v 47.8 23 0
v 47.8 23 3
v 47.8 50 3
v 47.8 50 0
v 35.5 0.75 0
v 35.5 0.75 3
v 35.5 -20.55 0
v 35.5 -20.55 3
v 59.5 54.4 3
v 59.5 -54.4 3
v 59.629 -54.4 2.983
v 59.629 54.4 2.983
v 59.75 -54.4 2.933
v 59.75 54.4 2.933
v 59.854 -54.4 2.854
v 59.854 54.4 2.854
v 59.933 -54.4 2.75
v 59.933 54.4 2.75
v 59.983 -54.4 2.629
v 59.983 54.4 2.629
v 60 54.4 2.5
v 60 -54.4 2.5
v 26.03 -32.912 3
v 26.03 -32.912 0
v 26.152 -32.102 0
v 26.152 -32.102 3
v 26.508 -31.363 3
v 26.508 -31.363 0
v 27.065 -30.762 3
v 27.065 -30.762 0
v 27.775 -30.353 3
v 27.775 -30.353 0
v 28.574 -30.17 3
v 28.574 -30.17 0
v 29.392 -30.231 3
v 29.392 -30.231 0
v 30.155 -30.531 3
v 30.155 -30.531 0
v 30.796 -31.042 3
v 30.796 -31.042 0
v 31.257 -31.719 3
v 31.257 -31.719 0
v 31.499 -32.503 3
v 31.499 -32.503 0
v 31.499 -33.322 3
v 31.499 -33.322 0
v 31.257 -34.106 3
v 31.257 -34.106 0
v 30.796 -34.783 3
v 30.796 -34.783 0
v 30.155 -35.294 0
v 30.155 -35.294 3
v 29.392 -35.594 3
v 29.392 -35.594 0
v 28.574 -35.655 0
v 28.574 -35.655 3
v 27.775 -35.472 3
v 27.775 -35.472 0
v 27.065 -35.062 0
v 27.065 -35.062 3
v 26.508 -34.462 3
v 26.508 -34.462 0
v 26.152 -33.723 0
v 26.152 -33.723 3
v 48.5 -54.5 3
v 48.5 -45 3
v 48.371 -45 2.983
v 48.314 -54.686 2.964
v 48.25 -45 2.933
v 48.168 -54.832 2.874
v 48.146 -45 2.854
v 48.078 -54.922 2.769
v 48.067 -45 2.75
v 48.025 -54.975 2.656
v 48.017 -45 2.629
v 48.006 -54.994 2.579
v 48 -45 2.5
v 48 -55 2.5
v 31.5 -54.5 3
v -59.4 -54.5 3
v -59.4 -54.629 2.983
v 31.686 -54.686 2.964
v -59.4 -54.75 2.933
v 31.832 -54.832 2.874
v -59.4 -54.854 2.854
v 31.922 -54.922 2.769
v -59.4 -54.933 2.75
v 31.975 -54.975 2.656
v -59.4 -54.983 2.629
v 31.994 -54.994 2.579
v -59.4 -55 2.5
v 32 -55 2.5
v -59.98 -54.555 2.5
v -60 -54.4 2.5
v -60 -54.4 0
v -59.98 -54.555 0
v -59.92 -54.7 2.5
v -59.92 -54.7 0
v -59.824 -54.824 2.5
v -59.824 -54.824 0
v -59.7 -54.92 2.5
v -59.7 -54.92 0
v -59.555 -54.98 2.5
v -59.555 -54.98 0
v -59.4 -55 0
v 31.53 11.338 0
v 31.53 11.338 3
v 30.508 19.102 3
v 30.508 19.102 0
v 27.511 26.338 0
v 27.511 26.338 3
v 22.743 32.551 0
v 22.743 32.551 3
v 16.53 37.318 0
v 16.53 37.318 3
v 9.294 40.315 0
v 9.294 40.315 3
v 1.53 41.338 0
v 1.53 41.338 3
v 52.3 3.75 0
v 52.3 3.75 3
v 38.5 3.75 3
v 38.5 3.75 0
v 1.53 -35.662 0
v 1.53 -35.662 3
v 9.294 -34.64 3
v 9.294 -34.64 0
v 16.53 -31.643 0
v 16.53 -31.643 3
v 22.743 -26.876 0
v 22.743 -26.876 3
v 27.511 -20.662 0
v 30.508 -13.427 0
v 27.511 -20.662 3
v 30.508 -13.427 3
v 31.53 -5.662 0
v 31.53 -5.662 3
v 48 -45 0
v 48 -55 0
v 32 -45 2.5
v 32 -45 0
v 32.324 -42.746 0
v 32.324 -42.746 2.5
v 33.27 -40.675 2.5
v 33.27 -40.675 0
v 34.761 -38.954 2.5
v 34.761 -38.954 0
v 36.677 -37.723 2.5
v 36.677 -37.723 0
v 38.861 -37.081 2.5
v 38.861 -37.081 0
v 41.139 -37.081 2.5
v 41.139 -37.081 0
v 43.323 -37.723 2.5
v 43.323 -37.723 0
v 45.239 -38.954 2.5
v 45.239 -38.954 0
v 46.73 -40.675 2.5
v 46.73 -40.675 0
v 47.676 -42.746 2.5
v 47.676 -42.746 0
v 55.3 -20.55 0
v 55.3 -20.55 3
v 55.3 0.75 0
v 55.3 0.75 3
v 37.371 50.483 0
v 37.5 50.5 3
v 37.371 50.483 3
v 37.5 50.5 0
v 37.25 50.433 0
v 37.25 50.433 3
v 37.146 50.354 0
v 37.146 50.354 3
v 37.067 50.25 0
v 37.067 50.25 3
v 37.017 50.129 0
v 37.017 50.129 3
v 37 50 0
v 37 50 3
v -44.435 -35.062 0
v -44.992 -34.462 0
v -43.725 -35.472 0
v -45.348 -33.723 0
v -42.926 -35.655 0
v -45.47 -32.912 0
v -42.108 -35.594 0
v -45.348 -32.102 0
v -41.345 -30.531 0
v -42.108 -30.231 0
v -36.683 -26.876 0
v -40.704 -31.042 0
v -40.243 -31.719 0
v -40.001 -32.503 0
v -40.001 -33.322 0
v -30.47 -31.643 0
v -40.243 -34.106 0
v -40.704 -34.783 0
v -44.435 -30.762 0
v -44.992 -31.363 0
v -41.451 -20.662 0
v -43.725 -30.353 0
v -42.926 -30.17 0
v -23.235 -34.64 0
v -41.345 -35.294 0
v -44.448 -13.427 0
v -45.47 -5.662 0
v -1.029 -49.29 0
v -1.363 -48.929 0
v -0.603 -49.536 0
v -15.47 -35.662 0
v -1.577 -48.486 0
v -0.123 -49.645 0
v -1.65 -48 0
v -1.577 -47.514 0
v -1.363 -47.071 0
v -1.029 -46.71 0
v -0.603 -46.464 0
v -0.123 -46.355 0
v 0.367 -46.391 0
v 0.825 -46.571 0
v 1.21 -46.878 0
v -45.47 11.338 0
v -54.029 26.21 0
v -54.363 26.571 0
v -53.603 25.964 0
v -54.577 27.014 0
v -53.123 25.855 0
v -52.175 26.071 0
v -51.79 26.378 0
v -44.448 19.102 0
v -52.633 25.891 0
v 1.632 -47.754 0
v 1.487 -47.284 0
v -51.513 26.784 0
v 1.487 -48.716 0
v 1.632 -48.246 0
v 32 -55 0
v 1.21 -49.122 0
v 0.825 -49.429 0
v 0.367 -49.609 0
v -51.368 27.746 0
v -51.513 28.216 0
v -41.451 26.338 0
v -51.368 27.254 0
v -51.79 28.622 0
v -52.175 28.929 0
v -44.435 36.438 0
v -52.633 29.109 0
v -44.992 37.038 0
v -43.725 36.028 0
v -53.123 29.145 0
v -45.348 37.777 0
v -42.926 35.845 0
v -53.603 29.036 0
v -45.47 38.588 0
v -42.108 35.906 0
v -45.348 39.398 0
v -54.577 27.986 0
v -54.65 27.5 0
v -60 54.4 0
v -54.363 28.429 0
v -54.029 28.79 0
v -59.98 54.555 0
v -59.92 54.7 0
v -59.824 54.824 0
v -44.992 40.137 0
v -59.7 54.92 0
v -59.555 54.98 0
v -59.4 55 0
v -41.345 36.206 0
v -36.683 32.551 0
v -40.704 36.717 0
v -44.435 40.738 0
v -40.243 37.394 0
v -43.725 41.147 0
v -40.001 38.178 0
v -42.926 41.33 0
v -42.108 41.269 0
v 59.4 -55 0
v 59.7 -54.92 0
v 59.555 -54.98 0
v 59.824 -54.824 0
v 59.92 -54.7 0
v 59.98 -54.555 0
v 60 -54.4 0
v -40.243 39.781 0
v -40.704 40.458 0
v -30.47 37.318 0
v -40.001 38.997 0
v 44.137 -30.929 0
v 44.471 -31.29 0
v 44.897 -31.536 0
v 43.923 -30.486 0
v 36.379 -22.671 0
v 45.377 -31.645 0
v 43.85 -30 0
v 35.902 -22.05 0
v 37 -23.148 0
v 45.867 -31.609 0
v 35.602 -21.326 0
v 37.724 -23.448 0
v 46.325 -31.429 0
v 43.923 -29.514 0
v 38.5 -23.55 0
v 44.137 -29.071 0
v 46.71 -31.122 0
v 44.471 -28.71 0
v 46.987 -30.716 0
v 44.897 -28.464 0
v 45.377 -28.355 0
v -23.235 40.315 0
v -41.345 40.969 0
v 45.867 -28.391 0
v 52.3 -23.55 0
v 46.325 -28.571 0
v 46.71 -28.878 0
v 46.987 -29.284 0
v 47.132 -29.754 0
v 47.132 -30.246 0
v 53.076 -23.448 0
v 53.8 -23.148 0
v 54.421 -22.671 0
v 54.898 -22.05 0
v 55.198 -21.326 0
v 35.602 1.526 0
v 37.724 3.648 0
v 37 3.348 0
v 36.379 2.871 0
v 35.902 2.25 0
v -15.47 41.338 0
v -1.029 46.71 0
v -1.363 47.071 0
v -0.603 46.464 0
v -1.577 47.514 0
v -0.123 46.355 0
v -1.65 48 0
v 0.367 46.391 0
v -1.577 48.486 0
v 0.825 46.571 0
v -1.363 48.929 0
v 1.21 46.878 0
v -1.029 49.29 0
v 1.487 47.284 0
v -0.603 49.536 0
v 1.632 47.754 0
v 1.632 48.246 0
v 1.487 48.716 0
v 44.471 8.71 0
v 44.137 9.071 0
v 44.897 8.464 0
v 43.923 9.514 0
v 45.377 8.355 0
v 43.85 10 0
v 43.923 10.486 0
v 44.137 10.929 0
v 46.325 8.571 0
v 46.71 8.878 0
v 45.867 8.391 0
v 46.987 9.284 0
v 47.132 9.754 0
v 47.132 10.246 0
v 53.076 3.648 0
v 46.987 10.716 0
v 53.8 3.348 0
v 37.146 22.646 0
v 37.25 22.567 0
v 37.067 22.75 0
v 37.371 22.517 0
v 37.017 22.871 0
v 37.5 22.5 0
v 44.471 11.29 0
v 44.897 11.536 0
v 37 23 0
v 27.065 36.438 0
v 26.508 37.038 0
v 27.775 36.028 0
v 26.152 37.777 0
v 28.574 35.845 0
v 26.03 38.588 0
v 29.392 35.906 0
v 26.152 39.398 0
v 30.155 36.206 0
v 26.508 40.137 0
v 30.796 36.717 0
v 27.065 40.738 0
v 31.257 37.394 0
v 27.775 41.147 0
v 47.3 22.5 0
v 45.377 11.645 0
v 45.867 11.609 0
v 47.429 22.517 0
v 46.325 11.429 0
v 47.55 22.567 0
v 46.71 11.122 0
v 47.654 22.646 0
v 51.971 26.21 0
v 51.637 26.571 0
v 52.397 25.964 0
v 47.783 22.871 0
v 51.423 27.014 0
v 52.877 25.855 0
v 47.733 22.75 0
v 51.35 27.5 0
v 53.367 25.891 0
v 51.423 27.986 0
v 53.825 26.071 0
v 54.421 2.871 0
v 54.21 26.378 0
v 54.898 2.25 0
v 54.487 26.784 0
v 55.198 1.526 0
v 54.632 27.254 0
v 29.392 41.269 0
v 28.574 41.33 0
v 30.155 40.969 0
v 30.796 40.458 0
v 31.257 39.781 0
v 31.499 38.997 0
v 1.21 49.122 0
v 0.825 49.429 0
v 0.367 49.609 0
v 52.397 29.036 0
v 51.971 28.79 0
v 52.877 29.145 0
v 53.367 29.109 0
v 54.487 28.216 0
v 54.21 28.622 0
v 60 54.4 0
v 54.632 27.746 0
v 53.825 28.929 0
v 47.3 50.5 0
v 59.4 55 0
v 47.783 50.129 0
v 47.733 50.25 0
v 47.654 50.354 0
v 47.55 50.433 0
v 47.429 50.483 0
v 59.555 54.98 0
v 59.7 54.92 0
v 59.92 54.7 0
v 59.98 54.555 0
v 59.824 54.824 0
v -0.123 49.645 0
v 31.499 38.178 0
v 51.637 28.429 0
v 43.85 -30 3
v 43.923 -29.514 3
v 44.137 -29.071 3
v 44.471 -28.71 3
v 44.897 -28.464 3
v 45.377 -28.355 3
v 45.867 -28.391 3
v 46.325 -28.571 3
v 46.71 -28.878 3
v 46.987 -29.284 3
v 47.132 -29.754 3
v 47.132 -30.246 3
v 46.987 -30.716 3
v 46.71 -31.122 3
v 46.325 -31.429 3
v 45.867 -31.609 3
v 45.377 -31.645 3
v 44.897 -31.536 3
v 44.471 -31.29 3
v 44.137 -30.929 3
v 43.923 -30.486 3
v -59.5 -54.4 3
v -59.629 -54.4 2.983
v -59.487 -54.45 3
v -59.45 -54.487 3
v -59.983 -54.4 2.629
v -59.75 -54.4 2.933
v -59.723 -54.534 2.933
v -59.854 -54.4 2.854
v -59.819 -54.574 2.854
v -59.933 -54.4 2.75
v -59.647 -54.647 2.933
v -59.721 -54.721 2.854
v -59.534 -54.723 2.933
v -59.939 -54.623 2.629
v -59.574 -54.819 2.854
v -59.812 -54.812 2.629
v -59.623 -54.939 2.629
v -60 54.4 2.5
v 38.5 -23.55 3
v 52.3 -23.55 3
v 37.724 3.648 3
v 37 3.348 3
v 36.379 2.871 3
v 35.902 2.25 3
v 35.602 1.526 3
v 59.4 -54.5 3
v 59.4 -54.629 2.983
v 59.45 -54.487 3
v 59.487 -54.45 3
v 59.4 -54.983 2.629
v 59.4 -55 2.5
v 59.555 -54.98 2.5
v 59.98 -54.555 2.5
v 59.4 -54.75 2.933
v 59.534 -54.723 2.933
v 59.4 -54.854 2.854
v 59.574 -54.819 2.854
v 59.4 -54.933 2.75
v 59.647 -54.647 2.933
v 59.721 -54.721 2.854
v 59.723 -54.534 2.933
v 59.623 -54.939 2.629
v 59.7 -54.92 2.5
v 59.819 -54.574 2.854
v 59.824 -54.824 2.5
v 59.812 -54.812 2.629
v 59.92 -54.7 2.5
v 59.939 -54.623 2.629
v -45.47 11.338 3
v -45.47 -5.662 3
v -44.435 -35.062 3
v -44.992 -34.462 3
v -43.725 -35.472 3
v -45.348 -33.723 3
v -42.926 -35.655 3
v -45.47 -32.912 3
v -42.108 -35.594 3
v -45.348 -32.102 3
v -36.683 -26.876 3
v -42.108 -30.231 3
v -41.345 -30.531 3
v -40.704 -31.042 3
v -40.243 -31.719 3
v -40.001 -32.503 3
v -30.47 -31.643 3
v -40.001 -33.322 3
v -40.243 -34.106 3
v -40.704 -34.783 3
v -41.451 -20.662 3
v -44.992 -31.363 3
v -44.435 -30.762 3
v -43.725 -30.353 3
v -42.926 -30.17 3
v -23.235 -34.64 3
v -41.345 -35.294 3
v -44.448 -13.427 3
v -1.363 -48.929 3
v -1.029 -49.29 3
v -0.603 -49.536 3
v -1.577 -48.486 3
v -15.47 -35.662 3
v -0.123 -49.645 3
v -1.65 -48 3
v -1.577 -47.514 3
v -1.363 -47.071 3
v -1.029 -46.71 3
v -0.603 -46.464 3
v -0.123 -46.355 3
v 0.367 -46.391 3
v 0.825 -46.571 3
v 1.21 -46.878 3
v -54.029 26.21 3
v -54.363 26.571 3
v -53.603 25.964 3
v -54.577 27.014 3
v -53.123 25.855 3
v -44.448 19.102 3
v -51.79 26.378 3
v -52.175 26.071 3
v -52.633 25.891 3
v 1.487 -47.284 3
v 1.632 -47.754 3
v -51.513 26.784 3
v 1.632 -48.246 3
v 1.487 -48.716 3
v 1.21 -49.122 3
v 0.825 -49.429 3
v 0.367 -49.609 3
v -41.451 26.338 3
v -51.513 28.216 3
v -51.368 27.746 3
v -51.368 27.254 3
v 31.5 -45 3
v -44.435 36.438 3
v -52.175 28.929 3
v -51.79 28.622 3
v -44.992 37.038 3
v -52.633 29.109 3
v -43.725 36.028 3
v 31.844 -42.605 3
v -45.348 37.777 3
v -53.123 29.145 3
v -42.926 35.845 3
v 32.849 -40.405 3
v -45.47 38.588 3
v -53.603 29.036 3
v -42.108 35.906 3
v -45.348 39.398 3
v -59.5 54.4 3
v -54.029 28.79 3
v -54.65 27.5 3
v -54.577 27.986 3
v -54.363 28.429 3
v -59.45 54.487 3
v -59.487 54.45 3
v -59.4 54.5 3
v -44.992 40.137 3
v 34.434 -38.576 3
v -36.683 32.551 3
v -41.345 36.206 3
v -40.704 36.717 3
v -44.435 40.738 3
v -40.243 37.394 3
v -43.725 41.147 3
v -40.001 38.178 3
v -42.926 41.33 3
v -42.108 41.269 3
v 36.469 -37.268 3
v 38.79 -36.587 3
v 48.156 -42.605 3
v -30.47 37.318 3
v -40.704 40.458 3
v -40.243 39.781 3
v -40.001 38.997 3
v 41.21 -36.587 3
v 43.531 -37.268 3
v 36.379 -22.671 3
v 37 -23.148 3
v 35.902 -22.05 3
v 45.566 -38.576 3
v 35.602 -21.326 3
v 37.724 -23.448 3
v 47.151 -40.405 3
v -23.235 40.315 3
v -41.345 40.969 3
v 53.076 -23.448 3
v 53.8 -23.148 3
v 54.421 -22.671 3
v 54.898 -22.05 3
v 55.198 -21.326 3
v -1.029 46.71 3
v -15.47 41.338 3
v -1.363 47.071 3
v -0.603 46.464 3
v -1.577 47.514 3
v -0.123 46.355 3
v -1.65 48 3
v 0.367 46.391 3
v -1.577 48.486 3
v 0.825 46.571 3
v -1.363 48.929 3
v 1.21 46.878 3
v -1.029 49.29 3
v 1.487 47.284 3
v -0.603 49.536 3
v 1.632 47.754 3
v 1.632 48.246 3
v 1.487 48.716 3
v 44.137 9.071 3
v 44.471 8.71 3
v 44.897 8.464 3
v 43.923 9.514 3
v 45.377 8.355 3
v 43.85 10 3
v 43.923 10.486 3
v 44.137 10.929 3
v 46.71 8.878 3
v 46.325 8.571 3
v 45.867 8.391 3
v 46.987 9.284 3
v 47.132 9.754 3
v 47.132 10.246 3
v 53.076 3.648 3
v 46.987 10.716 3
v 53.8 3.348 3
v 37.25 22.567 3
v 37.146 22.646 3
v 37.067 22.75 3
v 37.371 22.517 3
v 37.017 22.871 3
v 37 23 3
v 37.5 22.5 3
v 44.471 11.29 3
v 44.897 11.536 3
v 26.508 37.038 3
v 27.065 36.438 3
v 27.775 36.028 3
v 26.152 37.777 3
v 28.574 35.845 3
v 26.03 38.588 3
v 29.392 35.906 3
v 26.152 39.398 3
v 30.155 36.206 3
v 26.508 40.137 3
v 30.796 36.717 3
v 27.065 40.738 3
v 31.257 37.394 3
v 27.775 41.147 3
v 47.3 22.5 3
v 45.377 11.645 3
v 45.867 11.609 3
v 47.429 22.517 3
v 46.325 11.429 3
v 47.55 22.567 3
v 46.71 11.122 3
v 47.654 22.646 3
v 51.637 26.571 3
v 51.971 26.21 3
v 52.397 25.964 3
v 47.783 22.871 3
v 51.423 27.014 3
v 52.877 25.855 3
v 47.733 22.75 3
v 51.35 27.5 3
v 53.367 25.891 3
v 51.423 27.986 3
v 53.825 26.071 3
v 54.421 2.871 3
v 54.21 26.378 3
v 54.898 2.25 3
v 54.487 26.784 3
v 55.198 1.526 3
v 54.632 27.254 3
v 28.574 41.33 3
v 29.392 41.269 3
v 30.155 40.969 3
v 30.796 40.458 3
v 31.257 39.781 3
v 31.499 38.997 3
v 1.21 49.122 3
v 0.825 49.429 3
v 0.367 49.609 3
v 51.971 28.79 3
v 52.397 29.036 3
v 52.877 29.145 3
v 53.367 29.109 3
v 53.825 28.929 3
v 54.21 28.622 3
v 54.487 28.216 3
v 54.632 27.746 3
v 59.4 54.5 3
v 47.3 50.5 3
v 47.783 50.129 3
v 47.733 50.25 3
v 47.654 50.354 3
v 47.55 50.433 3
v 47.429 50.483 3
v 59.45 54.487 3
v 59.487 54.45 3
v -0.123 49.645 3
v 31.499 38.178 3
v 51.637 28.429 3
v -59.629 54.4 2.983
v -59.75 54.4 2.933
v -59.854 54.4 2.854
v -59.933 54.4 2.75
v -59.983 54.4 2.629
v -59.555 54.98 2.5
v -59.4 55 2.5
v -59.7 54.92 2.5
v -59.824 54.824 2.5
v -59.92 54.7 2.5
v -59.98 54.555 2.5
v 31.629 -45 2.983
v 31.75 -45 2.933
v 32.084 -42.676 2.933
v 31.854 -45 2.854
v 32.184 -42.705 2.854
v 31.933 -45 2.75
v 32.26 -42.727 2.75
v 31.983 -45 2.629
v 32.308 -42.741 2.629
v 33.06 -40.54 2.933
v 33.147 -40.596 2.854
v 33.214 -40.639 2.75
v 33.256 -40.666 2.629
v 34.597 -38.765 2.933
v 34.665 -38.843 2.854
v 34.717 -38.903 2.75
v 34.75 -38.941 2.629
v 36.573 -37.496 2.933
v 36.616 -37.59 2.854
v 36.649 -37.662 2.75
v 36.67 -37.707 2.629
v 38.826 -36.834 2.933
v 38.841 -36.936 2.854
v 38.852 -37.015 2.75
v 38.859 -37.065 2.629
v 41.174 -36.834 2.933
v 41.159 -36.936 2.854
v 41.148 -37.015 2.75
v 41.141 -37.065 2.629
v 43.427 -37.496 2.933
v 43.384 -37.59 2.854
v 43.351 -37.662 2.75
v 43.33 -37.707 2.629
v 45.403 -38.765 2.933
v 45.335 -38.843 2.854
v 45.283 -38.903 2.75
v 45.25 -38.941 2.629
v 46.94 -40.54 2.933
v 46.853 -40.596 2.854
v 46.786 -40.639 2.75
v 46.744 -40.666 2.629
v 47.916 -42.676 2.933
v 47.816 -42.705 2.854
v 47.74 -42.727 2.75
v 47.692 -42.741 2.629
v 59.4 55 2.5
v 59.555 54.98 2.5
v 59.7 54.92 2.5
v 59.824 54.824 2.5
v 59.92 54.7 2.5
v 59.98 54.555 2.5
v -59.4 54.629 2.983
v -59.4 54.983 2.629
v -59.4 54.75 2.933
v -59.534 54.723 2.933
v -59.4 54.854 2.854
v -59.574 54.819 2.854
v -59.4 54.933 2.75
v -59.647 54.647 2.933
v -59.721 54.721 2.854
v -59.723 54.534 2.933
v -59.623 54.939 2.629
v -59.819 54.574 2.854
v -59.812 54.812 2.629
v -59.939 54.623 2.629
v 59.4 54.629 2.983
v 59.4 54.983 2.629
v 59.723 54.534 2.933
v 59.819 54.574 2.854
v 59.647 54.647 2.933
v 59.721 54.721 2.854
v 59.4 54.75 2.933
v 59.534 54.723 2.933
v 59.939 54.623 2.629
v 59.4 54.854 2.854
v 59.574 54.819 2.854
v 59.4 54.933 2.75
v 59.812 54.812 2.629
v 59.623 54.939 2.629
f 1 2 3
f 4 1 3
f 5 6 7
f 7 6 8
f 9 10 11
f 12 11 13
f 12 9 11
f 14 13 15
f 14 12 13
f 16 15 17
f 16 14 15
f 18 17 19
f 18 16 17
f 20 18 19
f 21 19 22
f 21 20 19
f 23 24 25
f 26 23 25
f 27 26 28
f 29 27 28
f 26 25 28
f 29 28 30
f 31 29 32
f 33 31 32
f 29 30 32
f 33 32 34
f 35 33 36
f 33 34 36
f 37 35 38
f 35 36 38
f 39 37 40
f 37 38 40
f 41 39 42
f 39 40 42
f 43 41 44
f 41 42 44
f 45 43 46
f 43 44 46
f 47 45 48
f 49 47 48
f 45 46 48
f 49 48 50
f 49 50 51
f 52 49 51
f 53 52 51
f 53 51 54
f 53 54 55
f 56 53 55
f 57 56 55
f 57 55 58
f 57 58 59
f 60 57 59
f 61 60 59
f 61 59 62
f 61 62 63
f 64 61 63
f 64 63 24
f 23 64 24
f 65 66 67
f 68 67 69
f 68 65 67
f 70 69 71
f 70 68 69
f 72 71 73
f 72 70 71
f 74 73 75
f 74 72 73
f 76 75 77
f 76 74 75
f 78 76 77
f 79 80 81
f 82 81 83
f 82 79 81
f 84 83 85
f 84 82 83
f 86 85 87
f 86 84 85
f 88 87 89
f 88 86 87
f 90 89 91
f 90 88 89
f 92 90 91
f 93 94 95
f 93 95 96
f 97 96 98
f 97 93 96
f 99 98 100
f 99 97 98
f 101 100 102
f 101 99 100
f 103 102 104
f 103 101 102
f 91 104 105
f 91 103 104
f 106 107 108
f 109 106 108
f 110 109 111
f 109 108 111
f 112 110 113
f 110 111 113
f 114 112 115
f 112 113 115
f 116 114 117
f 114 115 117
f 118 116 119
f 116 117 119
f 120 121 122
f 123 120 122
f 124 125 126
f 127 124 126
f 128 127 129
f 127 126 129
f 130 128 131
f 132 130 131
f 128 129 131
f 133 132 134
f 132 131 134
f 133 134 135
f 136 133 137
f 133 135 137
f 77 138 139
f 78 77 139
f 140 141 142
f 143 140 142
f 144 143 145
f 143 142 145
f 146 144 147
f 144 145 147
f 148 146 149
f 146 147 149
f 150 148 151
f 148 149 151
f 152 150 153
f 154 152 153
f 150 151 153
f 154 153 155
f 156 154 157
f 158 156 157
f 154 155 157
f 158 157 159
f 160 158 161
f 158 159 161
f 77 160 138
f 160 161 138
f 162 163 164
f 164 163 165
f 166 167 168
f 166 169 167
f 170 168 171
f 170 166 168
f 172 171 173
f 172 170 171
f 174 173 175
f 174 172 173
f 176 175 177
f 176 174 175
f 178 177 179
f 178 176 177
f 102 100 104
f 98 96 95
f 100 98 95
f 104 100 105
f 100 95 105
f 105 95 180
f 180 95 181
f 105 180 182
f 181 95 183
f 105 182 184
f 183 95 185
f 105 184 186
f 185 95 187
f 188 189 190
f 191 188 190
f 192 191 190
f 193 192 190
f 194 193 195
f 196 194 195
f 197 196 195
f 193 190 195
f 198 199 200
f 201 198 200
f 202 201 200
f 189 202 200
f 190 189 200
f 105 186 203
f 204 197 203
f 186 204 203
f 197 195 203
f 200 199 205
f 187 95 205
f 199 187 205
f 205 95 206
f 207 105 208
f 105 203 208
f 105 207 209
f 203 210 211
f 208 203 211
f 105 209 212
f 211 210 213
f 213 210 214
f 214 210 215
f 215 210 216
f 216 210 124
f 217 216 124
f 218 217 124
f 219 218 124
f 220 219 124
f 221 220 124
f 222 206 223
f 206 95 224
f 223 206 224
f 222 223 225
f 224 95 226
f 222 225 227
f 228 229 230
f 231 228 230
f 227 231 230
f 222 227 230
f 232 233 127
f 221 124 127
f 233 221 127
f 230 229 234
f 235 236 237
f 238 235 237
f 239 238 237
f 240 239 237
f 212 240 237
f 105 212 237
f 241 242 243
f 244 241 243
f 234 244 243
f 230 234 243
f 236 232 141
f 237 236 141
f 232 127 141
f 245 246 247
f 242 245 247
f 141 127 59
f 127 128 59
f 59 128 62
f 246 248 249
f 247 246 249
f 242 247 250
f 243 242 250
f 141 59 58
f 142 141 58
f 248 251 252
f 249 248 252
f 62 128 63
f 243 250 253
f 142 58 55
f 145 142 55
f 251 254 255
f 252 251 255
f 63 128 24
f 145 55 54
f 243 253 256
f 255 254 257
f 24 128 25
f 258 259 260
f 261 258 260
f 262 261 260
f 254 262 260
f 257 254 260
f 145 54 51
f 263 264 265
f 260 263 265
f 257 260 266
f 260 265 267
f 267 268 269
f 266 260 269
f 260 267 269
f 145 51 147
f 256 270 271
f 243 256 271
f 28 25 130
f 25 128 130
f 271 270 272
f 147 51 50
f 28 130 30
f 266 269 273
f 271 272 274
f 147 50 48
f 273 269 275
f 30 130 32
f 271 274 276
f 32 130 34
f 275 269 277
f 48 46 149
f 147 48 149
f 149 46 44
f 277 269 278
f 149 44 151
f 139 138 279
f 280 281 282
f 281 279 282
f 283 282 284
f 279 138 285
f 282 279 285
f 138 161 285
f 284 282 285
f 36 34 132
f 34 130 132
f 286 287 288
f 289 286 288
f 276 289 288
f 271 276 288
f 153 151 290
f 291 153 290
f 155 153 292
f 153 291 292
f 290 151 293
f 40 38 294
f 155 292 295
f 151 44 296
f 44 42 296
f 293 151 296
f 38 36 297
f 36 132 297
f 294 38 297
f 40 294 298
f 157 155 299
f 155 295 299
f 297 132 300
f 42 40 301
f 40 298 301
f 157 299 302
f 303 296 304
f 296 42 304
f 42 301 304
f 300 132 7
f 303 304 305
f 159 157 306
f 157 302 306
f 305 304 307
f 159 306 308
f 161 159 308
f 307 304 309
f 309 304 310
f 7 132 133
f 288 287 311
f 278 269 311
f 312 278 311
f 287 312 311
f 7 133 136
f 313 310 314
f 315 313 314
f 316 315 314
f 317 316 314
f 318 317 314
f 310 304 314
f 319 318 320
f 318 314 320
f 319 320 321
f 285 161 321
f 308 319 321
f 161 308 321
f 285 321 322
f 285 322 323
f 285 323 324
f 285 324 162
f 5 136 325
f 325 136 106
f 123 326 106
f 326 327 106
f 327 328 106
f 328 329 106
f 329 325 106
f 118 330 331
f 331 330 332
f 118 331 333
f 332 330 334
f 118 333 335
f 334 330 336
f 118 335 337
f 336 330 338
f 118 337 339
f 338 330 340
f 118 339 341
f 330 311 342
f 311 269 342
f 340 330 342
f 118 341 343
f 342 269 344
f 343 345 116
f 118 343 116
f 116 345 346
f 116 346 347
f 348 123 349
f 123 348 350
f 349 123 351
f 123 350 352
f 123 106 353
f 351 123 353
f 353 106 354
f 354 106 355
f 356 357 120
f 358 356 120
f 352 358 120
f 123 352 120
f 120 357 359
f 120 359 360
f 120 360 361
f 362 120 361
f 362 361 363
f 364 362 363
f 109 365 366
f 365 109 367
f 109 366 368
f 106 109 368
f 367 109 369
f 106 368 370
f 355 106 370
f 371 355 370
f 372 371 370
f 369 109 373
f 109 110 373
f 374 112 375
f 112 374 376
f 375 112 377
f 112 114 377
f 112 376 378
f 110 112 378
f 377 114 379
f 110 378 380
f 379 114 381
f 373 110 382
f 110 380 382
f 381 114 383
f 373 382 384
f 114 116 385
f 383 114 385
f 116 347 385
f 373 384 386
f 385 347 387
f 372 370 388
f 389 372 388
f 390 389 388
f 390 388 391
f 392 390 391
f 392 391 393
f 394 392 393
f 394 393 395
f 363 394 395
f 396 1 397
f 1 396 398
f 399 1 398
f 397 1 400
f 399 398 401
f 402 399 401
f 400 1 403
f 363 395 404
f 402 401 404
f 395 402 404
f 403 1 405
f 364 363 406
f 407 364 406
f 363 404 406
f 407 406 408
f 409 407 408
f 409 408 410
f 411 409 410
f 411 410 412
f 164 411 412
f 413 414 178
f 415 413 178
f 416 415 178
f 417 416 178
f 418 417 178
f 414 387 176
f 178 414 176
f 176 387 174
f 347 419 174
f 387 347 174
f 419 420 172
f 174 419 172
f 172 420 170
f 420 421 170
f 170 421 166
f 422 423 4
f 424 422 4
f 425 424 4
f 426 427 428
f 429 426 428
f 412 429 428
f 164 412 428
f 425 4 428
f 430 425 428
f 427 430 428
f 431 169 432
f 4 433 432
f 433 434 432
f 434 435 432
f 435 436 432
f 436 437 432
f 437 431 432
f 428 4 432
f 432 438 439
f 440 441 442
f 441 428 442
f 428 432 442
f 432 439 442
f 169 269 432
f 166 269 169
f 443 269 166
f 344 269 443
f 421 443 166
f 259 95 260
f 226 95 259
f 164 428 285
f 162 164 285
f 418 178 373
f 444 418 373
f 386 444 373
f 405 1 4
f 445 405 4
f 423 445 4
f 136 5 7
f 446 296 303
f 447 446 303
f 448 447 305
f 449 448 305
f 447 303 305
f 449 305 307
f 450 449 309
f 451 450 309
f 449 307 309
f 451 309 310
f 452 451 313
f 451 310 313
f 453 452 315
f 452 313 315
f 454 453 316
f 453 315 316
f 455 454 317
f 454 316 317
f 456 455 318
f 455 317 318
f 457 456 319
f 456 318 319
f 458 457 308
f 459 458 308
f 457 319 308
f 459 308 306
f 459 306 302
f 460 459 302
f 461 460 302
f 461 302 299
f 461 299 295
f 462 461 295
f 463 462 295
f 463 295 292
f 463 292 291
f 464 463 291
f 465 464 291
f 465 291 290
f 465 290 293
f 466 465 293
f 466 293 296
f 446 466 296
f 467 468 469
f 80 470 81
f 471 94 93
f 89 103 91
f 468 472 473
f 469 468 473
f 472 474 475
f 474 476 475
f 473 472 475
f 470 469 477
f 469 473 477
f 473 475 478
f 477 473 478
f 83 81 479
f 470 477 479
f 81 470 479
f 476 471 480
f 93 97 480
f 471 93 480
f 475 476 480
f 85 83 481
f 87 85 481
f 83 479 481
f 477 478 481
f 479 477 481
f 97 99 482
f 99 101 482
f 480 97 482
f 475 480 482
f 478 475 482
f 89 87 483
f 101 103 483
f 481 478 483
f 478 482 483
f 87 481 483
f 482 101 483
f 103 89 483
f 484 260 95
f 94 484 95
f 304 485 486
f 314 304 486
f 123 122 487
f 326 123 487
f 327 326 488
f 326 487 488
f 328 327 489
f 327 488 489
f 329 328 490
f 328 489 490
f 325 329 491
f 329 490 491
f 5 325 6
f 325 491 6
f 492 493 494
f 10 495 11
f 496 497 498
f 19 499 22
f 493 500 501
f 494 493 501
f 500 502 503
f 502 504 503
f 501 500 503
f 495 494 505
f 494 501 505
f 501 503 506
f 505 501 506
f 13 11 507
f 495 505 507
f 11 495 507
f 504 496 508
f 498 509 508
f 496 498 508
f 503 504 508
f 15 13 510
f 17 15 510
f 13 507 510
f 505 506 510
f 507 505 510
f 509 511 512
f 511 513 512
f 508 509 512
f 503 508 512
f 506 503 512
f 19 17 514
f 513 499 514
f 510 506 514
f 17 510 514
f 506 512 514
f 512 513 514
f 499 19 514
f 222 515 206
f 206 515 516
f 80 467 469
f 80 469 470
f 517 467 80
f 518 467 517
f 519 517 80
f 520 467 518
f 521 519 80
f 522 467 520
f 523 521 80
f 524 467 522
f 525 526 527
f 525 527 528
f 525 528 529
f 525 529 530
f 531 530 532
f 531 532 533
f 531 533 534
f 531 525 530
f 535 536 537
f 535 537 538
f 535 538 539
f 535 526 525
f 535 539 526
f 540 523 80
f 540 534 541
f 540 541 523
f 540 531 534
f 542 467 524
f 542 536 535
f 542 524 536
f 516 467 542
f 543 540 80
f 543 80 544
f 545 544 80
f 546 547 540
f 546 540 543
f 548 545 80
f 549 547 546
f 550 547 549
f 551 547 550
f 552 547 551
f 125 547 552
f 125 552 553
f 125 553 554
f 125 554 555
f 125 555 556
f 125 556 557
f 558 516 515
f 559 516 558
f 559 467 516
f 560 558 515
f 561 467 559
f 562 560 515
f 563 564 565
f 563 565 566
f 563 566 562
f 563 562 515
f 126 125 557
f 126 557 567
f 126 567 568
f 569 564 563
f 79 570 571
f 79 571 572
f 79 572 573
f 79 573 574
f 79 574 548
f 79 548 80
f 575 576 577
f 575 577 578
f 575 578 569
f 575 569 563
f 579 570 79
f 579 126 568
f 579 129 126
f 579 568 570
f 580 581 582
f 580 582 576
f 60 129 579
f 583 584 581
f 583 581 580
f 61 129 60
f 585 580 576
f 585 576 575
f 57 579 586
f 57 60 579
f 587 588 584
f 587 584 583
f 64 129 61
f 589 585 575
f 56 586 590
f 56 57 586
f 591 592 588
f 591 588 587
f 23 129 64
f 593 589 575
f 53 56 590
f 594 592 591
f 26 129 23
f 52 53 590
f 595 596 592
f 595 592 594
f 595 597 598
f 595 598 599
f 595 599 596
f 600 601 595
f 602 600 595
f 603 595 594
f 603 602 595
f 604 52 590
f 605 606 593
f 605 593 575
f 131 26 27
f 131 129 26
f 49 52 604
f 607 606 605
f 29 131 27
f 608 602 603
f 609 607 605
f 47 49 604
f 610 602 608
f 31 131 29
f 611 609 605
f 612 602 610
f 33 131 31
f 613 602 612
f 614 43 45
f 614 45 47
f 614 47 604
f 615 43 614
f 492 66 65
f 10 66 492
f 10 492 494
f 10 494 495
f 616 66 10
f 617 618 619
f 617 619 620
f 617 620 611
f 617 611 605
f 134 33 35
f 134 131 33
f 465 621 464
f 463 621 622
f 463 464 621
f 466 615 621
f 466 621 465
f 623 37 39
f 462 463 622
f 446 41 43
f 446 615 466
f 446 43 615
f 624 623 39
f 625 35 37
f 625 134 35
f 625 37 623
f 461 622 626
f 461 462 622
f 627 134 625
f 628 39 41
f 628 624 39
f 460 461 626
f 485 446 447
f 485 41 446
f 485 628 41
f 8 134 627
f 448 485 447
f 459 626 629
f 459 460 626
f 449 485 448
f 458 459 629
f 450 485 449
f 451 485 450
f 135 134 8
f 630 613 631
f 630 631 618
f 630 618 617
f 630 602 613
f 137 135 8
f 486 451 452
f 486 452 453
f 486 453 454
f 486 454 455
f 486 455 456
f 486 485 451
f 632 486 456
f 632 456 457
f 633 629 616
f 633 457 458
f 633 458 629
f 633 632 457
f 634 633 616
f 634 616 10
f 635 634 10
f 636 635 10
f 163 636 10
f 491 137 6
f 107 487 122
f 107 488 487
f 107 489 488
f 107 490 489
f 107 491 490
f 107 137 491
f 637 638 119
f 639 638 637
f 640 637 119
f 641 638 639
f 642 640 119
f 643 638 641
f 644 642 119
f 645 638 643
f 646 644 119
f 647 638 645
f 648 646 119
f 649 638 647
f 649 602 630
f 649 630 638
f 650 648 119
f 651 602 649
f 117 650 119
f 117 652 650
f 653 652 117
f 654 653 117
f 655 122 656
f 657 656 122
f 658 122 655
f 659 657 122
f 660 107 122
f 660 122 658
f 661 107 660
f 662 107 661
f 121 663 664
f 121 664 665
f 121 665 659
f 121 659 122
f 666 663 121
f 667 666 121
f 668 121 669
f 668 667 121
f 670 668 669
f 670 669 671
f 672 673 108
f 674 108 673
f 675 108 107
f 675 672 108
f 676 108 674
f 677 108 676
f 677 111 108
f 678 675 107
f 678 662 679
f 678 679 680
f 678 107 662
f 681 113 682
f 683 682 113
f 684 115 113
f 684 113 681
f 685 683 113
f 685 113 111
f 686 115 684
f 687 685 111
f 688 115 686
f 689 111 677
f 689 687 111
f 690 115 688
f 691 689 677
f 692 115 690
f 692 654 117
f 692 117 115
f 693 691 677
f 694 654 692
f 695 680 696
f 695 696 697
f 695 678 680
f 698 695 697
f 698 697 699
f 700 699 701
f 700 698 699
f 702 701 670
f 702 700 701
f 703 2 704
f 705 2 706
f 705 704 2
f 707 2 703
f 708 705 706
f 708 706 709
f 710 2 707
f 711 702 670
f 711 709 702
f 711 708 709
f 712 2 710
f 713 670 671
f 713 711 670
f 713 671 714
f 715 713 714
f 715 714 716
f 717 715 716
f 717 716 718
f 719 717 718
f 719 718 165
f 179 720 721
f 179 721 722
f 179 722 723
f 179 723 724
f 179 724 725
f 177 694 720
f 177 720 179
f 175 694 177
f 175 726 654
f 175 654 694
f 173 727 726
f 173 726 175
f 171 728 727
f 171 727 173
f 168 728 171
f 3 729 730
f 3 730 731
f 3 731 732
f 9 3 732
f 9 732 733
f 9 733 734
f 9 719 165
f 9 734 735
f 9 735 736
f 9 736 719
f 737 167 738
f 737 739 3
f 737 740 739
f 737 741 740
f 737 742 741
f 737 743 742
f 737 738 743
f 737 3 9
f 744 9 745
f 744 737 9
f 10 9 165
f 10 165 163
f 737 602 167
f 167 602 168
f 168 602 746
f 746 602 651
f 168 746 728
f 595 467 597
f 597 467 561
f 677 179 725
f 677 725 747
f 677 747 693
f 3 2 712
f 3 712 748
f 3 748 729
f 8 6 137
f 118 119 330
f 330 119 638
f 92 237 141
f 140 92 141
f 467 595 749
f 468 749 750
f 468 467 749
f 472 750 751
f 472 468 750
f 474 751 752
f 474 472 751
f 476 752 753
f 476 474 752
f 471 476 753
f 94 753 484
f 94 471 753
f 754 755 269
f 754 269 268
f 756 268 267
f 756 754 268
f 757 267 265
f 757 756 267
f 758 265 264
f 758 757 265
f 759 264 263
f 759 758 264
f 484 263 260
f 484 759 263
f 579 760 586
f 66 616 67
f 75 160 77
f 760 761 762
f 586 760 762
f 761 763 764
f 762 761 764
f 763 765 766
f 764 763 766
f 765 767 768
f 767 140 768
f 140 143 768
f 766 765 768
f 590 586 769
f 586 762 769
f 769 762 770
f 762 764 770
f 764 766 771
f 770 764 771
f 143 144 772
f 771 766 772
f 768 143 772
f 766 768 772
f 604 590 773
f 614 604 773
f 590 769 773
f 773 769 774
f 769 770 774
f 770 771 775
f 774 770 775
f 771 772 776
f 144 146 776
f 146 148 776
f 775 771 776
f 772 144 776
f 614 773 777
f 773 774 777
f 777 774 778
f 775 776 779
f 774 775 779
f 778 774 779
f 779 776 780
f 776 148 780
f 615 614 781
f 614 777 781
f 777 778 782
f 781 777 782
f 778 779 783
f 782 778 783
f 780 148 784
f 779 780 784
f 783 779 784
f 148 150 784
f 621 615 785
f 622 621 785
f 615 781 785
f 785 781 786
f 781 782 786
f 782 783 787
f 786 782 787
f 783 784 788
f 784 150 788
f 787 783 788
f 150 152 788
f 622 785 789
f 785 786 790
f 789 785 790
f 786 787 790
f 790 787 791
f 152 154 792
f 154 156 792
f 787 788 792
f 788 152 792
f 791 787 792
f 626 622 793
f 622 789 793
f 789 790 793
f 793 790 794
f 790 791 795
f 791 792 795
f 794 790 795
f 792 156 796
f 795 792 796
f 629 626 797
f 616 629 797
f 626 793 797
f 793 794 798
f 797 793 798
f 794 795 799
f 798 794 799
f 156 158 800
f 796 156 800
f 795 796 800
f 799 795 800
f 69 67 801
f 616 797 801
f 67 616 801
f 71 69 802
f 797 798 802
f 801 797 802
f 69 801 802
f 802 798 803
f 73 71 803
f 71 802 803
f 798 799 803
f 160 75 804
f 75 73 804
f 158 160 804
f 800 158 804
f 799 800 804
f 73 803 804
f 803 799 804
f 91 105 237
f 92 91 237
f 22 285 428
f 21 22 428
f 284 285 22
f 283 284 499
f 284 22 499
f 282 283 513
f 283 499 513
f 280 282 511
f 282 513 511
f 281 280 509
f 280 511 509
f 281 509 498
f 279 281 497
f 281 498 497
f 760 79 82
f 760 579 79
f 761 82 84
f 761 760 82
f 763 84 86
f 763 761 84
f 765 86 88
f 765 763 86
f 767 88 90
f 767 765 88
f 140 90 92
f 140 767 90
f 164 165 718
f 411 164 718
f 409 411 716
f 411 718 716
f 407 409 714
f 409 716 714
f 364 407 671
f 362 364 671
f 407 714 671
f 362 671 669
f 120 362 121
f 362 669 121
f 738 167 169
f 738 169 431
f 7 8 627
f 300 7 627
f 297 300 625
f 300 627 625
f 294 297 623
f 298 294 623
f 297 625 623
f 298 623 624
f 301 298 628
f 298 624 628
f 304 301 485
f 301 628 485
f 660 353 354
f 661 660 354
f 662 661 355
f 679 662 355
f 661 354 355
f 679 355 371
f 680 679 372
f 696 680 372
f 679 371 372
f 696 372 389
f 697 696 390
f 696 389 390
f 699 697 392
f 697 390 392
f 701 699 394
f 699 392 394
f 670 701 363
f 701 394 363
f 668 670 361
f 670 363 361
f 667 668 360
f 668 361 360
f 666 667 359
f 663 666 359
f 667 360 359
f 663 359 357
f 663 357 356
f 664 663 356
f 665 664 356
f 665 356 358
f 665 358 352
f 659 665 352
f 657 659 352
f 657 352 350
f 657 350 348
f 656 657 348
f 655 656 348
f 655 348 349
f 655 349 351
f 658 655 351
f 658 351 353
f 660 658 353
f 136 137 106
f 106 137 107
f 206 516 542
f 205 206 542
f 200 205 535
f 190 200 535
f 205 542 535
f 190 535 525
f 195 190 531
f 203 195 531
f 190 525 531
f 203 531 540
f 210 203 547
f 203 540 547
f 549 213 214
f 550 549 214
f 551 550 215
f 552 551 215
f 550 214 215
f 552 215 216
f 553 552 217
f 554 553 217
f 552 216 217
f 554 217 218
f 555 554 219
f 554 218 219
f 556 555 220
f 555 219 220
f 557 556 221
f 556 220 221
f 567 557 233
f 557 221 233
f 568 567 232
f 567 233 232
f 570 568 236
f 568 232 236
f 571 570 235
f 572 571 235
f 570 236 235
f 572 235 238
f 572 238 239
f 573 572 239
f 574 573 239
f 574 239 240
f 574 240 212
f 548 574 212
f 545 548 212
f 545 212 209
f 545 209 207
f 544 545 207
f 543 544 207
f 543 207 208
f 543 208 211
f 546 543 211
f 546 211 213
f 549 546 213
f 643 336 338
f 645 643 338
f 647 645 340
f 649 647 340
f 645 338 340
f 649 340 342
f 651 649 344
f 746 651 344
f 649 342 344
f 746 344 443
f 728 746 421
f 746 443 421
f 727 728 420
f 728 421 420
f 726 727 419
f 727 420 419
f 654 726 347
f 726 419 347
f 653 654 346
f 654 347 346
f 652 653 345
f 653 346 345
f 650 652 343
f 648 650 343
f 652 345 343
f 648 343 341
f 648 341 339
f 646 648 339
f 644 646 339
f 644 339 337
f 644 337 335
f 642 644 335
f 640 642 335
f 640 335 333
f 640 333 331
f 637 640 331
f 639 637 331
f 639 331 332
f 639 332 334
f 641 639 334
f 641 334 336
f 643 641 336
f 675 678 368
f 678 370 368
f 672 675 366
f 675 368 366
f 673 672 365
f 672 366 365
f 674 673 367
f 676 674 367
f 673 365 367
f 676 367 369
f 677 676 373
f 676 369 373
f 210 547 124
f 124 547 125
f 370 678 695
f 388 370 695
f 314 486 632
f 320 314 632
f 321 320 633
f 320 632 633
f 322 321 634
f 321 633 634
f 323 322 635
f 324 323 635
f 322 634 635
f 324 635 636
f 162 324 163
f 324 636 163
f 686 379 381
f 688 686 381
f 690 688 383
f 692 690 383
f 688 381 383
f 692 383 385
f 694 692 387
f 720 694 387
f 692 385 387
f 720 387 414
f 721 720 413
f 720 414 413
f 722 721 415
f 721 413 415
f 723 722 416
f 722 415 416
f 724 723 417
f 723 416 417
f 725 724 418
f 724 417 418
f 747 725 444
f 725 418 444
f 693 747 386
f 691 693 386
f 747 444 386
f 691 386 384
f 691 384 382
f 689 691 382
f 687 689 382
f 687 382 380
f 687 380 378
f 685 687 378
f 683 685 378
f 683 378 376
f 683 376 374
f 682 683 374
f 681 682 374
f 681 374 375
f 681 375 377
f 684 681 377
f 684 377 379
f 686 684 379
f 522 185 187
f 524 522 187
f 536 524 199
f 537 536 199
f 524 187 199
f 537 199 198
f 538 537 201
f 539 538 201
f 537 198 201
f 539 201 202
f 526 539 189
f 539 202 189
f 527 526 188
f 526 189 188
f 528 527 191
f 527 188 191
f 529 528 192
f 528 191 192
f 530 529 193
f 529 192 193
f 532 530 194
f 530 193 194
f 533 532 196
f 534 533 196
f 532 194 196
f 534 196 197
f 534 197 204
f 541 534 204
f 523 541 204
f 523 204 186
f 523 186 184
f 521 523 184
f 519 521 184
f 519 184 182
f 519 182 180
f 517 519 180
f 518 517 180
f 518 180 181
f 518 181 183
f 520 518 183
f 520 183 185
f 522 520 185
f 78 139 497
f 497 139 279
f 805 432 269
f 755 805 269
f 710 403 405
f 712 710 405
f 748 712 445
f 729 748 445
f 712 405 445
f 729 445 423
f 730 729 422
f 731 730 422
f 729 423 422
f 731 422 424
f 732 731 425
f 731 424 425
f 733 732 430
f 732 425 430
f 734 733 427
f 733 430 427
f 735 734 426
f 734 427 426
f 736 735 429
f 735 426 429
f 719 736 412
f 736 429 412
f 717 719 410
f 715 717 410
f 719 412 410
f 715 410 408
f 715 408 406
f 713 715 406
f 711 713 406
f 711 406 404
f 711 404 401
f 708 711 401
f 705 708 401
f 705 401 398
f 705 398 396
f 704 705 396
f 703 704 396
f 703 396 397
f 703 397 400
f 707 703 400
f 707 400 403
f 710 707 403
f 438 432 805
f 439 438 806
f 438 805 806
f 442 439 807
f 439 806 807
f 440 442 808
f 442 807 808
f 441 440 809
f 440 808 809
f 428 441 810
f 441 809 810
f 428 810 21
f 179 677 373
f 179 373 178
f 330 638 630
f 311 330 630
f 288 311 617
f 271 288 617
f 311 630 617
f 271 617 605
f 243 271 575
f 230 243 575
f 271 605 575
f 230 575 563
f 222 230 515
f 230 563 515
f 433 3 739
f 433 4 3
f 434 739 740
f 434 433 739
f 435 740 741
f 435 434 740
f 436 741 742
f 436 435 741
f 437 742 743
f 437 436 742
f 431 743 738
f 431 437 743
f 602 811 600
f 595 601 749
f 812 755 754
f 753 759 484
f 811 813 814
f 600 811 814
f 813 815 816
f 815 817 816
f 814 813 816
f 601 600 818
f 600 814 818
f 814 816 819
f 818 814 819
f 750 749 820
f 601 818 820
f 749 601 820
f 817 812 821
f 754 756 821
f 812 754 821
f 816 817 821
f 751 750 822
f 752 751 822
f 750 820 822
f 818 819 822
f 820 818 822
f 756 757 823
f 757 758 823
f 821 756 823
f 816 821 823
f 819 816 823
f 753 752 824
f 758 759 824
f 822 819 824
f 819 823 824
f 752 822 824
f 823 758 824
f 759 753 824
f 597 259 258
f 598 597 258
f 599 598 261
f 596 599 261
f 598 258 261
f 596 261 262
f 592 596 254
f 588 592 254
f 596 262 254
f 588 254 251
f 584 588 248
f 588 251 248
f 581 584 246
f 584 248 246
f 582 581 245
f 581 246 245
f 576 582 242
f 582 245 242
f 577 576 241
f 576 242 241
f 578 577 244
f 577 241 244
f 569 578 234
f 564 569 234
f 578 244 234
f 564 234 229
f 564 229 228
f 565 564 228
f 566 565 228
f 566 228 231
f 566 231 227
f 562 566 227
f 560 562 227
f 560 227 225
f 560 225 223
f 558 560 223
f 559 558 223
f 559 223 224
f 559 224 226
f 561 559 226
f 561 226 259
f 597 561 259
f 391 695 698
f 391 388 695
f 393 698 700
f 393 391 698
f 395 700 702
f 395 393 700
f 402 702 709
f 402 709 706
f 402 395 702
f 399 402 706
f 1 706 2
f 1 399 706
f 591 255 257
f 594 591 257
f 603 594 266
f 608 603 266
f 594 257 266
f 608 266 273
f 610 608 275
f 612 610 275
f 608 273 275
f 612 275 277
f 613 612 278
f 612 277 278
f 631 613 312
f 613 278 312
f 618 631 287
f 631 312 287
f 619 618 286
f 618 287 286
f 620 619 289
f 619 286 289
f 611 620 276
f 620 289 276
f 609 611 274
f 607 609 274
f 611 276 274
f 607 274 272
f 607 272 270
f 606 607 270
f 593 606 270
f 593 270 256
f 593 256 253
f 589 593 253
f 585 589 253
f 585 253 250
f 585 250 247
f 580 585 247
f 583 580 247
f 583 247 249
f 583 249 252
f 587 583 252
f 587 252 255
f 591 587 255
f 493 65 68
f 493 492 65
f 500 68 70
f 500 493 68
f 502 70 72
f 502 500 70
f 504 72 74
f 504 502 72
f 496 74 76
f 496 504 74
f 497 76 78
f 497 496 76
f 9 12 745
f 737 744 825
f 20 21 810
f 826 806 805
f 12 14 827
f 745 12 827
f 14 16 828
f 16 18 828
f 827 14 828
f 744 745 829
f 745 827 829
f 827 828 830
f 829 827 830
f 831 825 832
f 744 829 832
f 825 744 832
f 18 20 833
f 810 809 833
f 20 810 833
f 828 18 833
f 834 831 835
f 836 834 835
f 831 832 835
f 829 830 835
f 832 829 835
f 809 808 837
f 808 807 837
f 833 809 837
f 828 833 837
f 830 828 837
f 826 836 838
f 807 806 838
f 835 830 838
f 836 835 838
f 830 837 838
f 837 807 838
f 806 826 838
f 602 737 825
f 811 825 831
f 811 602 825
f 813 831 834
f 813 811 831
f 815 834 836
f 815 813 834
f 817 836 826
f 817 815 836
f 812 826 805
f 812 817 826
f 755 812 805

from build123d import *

# Parameters (mm, degrees)
F1_DEPTH  = 3
F3_D      = 3.3
F5_D      = 5.5
F6_DEPTH  = 3.001
F7_R      = 0.6
F8_R      = 0.5
F10_D     = 3.3
F11_DEPTH = 3.001
F12_W     = 10.8
F12_H     = 28
F13_DEPTH = 3.001
F14_R     = 0.5


# Not quite as in the source:
# - a feature names something its author has since deleted; it is built from what else it names


with BuildPart() as f1:
    # F0 (on Top) → F1 (new body)
    with BuildSketch(Plane.XY):
        with BuildLine():
            Line((60, 55), (-60, 55))
            Line((-60, 55), (-60, -55))
            Line((-60, -55), (32, -55))
            Line((32, -55), (32, -45))
            ThreePointArc((32, -45), (40, -37), (48, -45))
            Line((48, -45), (48, -55))
            Line((48, -55), (60, -55))
            Line((60, -55), (60, 55))
        make_face()
    extrude(amount=F1_DEPTH)

    # F3 (through all)
    with Locations(Plane.XY.offset(3)):
        with Locations((-53, 27.5), (0, 48), (53, 27.5), (0, -48)):
            Hole(F3_D / 2)

    # F5 (through all)
    with Locations(Plane.XY.offset(3)):
        with Locations((-42.7202362838, 38.5875506155), (-42.7202362838, -32.9124493845), (28.7797637162, -32.9124493845), (28.7797637162, 38.5875506155)):
            Hole(F5_D / 2)

    # F4 (on face) → F6 (cut, through all)
    with BuildSketch(Plane.XY.offset(3)):
        with BuildLine():
            ThreePointArc((31.5297637162, 11.3375506155), (22.7429671518, 32.5507540511), (1.5297637162, 41.3375506155))
            Line((1.5297637162, 41.3375506155), (-15.4702362838, 41.3375506155))
            ThreePointArc((-15.4702362838, 41.3375506155), (-36.6834397194, 32.5507540511), (-45.4702362838, 11.3375506155))
            Line((-45.4702362838, 11.3375506155), (-45.4702362838, -5.6624493845))
            ThreePointArc((-45.4702362838, -5.6624493845), (-36.6834397194, -26.8756528201), (-15.4702362838, -35.6624493845))
            Line((-15.4702362838, -35.6624493845), (1.5297637162, -35.6624493845))
            ThreePointArc((1.5297637162, -35.6624493845), (22.7429671518, -26.8756528201), (31.5297637162, -5.6624493845))
            Line((31.5297637162, -5.6624493845), (31.5297637162, 11.3375506155))
        make_face()
    extrude(amount=-F6_DEPTH, mode=Mode.SUBTRACT)

    # F7
    f7_edges = [f1.edges().sort_by_distance(p)[0] for p in [
        (-60, 55, 1.5),
        (60, 55, 1.5),
        (60, -55, 1.5),
        (-60, -55, 1.5),
    ]]
    fillet(f7_edges, radius=F7_R)

    # F8
    f8_edges = [f1.edges().sort_by_distance(p)[0] for p in [
        (40, -37, 3),
        (-13.7, -55, 3),
    ]]
    fillet(f8_edges, radius=F8_R)

    # F10 (through all)
    with Locations(Plane.XY.offset(3)):
        with Locations((45.5, 10), (45.5, -30)):
            Hole(F10_D / 2)

    # F9 (on face) → F11 (cut, through all)
    with BuildSketch(Plane.XY.offset(3)):
        with BuildLine():
            Line((52.3, 3.75), (38.5, 3.75))
            ThreePointArc((38.5, 3.75), (36.3786796564, 2.8713203436), (35.5, 0.75))
            Line((35.5, 0.75), (35.5, -20.55))
            ThreePointArc((35.5, -20.55), (36.3786796564, -22.6713203436), (38.5, -23.55))
            Line((38.5, -23.55), (52.3, -23.55))
            ThreePointArc((52.3, -23.55), (54.4213203436, -22.6713203436), (55.3, -20.55))
            Line((55.3, -20.55), (55.3, 0.75))
            ThreePointArc((55.3, 0.75), (54.4213203436, 2.8713203436), (52.3, 3.75))
        make_face()
    extrude(amount=-F11_DEPTH, mode=Mode.SUBTRACT)

    # F12 (on face) → F13 (cut, through all)
    with BuildSketch(Plane.XY.offset(3)):
        with Locations((42.4, 36.5)):
            Rectangle(F12_W, F12_H)
    extrude(amount=-F13_DEPTH, mode=Mode.SUBTRACT)

    # F14
    f14_edges = [f1.edges().sort_by_distance(p)[0] for p in [
        (37, 22.5, 1.5),
        (37, 50.5, 1.5),
        (47.8, 50.5, 1.5),
        (47.8, 22.5, 1.5),
    ]]
    fillet(f14_edges, radius=F14_R)


solid = f1.part
